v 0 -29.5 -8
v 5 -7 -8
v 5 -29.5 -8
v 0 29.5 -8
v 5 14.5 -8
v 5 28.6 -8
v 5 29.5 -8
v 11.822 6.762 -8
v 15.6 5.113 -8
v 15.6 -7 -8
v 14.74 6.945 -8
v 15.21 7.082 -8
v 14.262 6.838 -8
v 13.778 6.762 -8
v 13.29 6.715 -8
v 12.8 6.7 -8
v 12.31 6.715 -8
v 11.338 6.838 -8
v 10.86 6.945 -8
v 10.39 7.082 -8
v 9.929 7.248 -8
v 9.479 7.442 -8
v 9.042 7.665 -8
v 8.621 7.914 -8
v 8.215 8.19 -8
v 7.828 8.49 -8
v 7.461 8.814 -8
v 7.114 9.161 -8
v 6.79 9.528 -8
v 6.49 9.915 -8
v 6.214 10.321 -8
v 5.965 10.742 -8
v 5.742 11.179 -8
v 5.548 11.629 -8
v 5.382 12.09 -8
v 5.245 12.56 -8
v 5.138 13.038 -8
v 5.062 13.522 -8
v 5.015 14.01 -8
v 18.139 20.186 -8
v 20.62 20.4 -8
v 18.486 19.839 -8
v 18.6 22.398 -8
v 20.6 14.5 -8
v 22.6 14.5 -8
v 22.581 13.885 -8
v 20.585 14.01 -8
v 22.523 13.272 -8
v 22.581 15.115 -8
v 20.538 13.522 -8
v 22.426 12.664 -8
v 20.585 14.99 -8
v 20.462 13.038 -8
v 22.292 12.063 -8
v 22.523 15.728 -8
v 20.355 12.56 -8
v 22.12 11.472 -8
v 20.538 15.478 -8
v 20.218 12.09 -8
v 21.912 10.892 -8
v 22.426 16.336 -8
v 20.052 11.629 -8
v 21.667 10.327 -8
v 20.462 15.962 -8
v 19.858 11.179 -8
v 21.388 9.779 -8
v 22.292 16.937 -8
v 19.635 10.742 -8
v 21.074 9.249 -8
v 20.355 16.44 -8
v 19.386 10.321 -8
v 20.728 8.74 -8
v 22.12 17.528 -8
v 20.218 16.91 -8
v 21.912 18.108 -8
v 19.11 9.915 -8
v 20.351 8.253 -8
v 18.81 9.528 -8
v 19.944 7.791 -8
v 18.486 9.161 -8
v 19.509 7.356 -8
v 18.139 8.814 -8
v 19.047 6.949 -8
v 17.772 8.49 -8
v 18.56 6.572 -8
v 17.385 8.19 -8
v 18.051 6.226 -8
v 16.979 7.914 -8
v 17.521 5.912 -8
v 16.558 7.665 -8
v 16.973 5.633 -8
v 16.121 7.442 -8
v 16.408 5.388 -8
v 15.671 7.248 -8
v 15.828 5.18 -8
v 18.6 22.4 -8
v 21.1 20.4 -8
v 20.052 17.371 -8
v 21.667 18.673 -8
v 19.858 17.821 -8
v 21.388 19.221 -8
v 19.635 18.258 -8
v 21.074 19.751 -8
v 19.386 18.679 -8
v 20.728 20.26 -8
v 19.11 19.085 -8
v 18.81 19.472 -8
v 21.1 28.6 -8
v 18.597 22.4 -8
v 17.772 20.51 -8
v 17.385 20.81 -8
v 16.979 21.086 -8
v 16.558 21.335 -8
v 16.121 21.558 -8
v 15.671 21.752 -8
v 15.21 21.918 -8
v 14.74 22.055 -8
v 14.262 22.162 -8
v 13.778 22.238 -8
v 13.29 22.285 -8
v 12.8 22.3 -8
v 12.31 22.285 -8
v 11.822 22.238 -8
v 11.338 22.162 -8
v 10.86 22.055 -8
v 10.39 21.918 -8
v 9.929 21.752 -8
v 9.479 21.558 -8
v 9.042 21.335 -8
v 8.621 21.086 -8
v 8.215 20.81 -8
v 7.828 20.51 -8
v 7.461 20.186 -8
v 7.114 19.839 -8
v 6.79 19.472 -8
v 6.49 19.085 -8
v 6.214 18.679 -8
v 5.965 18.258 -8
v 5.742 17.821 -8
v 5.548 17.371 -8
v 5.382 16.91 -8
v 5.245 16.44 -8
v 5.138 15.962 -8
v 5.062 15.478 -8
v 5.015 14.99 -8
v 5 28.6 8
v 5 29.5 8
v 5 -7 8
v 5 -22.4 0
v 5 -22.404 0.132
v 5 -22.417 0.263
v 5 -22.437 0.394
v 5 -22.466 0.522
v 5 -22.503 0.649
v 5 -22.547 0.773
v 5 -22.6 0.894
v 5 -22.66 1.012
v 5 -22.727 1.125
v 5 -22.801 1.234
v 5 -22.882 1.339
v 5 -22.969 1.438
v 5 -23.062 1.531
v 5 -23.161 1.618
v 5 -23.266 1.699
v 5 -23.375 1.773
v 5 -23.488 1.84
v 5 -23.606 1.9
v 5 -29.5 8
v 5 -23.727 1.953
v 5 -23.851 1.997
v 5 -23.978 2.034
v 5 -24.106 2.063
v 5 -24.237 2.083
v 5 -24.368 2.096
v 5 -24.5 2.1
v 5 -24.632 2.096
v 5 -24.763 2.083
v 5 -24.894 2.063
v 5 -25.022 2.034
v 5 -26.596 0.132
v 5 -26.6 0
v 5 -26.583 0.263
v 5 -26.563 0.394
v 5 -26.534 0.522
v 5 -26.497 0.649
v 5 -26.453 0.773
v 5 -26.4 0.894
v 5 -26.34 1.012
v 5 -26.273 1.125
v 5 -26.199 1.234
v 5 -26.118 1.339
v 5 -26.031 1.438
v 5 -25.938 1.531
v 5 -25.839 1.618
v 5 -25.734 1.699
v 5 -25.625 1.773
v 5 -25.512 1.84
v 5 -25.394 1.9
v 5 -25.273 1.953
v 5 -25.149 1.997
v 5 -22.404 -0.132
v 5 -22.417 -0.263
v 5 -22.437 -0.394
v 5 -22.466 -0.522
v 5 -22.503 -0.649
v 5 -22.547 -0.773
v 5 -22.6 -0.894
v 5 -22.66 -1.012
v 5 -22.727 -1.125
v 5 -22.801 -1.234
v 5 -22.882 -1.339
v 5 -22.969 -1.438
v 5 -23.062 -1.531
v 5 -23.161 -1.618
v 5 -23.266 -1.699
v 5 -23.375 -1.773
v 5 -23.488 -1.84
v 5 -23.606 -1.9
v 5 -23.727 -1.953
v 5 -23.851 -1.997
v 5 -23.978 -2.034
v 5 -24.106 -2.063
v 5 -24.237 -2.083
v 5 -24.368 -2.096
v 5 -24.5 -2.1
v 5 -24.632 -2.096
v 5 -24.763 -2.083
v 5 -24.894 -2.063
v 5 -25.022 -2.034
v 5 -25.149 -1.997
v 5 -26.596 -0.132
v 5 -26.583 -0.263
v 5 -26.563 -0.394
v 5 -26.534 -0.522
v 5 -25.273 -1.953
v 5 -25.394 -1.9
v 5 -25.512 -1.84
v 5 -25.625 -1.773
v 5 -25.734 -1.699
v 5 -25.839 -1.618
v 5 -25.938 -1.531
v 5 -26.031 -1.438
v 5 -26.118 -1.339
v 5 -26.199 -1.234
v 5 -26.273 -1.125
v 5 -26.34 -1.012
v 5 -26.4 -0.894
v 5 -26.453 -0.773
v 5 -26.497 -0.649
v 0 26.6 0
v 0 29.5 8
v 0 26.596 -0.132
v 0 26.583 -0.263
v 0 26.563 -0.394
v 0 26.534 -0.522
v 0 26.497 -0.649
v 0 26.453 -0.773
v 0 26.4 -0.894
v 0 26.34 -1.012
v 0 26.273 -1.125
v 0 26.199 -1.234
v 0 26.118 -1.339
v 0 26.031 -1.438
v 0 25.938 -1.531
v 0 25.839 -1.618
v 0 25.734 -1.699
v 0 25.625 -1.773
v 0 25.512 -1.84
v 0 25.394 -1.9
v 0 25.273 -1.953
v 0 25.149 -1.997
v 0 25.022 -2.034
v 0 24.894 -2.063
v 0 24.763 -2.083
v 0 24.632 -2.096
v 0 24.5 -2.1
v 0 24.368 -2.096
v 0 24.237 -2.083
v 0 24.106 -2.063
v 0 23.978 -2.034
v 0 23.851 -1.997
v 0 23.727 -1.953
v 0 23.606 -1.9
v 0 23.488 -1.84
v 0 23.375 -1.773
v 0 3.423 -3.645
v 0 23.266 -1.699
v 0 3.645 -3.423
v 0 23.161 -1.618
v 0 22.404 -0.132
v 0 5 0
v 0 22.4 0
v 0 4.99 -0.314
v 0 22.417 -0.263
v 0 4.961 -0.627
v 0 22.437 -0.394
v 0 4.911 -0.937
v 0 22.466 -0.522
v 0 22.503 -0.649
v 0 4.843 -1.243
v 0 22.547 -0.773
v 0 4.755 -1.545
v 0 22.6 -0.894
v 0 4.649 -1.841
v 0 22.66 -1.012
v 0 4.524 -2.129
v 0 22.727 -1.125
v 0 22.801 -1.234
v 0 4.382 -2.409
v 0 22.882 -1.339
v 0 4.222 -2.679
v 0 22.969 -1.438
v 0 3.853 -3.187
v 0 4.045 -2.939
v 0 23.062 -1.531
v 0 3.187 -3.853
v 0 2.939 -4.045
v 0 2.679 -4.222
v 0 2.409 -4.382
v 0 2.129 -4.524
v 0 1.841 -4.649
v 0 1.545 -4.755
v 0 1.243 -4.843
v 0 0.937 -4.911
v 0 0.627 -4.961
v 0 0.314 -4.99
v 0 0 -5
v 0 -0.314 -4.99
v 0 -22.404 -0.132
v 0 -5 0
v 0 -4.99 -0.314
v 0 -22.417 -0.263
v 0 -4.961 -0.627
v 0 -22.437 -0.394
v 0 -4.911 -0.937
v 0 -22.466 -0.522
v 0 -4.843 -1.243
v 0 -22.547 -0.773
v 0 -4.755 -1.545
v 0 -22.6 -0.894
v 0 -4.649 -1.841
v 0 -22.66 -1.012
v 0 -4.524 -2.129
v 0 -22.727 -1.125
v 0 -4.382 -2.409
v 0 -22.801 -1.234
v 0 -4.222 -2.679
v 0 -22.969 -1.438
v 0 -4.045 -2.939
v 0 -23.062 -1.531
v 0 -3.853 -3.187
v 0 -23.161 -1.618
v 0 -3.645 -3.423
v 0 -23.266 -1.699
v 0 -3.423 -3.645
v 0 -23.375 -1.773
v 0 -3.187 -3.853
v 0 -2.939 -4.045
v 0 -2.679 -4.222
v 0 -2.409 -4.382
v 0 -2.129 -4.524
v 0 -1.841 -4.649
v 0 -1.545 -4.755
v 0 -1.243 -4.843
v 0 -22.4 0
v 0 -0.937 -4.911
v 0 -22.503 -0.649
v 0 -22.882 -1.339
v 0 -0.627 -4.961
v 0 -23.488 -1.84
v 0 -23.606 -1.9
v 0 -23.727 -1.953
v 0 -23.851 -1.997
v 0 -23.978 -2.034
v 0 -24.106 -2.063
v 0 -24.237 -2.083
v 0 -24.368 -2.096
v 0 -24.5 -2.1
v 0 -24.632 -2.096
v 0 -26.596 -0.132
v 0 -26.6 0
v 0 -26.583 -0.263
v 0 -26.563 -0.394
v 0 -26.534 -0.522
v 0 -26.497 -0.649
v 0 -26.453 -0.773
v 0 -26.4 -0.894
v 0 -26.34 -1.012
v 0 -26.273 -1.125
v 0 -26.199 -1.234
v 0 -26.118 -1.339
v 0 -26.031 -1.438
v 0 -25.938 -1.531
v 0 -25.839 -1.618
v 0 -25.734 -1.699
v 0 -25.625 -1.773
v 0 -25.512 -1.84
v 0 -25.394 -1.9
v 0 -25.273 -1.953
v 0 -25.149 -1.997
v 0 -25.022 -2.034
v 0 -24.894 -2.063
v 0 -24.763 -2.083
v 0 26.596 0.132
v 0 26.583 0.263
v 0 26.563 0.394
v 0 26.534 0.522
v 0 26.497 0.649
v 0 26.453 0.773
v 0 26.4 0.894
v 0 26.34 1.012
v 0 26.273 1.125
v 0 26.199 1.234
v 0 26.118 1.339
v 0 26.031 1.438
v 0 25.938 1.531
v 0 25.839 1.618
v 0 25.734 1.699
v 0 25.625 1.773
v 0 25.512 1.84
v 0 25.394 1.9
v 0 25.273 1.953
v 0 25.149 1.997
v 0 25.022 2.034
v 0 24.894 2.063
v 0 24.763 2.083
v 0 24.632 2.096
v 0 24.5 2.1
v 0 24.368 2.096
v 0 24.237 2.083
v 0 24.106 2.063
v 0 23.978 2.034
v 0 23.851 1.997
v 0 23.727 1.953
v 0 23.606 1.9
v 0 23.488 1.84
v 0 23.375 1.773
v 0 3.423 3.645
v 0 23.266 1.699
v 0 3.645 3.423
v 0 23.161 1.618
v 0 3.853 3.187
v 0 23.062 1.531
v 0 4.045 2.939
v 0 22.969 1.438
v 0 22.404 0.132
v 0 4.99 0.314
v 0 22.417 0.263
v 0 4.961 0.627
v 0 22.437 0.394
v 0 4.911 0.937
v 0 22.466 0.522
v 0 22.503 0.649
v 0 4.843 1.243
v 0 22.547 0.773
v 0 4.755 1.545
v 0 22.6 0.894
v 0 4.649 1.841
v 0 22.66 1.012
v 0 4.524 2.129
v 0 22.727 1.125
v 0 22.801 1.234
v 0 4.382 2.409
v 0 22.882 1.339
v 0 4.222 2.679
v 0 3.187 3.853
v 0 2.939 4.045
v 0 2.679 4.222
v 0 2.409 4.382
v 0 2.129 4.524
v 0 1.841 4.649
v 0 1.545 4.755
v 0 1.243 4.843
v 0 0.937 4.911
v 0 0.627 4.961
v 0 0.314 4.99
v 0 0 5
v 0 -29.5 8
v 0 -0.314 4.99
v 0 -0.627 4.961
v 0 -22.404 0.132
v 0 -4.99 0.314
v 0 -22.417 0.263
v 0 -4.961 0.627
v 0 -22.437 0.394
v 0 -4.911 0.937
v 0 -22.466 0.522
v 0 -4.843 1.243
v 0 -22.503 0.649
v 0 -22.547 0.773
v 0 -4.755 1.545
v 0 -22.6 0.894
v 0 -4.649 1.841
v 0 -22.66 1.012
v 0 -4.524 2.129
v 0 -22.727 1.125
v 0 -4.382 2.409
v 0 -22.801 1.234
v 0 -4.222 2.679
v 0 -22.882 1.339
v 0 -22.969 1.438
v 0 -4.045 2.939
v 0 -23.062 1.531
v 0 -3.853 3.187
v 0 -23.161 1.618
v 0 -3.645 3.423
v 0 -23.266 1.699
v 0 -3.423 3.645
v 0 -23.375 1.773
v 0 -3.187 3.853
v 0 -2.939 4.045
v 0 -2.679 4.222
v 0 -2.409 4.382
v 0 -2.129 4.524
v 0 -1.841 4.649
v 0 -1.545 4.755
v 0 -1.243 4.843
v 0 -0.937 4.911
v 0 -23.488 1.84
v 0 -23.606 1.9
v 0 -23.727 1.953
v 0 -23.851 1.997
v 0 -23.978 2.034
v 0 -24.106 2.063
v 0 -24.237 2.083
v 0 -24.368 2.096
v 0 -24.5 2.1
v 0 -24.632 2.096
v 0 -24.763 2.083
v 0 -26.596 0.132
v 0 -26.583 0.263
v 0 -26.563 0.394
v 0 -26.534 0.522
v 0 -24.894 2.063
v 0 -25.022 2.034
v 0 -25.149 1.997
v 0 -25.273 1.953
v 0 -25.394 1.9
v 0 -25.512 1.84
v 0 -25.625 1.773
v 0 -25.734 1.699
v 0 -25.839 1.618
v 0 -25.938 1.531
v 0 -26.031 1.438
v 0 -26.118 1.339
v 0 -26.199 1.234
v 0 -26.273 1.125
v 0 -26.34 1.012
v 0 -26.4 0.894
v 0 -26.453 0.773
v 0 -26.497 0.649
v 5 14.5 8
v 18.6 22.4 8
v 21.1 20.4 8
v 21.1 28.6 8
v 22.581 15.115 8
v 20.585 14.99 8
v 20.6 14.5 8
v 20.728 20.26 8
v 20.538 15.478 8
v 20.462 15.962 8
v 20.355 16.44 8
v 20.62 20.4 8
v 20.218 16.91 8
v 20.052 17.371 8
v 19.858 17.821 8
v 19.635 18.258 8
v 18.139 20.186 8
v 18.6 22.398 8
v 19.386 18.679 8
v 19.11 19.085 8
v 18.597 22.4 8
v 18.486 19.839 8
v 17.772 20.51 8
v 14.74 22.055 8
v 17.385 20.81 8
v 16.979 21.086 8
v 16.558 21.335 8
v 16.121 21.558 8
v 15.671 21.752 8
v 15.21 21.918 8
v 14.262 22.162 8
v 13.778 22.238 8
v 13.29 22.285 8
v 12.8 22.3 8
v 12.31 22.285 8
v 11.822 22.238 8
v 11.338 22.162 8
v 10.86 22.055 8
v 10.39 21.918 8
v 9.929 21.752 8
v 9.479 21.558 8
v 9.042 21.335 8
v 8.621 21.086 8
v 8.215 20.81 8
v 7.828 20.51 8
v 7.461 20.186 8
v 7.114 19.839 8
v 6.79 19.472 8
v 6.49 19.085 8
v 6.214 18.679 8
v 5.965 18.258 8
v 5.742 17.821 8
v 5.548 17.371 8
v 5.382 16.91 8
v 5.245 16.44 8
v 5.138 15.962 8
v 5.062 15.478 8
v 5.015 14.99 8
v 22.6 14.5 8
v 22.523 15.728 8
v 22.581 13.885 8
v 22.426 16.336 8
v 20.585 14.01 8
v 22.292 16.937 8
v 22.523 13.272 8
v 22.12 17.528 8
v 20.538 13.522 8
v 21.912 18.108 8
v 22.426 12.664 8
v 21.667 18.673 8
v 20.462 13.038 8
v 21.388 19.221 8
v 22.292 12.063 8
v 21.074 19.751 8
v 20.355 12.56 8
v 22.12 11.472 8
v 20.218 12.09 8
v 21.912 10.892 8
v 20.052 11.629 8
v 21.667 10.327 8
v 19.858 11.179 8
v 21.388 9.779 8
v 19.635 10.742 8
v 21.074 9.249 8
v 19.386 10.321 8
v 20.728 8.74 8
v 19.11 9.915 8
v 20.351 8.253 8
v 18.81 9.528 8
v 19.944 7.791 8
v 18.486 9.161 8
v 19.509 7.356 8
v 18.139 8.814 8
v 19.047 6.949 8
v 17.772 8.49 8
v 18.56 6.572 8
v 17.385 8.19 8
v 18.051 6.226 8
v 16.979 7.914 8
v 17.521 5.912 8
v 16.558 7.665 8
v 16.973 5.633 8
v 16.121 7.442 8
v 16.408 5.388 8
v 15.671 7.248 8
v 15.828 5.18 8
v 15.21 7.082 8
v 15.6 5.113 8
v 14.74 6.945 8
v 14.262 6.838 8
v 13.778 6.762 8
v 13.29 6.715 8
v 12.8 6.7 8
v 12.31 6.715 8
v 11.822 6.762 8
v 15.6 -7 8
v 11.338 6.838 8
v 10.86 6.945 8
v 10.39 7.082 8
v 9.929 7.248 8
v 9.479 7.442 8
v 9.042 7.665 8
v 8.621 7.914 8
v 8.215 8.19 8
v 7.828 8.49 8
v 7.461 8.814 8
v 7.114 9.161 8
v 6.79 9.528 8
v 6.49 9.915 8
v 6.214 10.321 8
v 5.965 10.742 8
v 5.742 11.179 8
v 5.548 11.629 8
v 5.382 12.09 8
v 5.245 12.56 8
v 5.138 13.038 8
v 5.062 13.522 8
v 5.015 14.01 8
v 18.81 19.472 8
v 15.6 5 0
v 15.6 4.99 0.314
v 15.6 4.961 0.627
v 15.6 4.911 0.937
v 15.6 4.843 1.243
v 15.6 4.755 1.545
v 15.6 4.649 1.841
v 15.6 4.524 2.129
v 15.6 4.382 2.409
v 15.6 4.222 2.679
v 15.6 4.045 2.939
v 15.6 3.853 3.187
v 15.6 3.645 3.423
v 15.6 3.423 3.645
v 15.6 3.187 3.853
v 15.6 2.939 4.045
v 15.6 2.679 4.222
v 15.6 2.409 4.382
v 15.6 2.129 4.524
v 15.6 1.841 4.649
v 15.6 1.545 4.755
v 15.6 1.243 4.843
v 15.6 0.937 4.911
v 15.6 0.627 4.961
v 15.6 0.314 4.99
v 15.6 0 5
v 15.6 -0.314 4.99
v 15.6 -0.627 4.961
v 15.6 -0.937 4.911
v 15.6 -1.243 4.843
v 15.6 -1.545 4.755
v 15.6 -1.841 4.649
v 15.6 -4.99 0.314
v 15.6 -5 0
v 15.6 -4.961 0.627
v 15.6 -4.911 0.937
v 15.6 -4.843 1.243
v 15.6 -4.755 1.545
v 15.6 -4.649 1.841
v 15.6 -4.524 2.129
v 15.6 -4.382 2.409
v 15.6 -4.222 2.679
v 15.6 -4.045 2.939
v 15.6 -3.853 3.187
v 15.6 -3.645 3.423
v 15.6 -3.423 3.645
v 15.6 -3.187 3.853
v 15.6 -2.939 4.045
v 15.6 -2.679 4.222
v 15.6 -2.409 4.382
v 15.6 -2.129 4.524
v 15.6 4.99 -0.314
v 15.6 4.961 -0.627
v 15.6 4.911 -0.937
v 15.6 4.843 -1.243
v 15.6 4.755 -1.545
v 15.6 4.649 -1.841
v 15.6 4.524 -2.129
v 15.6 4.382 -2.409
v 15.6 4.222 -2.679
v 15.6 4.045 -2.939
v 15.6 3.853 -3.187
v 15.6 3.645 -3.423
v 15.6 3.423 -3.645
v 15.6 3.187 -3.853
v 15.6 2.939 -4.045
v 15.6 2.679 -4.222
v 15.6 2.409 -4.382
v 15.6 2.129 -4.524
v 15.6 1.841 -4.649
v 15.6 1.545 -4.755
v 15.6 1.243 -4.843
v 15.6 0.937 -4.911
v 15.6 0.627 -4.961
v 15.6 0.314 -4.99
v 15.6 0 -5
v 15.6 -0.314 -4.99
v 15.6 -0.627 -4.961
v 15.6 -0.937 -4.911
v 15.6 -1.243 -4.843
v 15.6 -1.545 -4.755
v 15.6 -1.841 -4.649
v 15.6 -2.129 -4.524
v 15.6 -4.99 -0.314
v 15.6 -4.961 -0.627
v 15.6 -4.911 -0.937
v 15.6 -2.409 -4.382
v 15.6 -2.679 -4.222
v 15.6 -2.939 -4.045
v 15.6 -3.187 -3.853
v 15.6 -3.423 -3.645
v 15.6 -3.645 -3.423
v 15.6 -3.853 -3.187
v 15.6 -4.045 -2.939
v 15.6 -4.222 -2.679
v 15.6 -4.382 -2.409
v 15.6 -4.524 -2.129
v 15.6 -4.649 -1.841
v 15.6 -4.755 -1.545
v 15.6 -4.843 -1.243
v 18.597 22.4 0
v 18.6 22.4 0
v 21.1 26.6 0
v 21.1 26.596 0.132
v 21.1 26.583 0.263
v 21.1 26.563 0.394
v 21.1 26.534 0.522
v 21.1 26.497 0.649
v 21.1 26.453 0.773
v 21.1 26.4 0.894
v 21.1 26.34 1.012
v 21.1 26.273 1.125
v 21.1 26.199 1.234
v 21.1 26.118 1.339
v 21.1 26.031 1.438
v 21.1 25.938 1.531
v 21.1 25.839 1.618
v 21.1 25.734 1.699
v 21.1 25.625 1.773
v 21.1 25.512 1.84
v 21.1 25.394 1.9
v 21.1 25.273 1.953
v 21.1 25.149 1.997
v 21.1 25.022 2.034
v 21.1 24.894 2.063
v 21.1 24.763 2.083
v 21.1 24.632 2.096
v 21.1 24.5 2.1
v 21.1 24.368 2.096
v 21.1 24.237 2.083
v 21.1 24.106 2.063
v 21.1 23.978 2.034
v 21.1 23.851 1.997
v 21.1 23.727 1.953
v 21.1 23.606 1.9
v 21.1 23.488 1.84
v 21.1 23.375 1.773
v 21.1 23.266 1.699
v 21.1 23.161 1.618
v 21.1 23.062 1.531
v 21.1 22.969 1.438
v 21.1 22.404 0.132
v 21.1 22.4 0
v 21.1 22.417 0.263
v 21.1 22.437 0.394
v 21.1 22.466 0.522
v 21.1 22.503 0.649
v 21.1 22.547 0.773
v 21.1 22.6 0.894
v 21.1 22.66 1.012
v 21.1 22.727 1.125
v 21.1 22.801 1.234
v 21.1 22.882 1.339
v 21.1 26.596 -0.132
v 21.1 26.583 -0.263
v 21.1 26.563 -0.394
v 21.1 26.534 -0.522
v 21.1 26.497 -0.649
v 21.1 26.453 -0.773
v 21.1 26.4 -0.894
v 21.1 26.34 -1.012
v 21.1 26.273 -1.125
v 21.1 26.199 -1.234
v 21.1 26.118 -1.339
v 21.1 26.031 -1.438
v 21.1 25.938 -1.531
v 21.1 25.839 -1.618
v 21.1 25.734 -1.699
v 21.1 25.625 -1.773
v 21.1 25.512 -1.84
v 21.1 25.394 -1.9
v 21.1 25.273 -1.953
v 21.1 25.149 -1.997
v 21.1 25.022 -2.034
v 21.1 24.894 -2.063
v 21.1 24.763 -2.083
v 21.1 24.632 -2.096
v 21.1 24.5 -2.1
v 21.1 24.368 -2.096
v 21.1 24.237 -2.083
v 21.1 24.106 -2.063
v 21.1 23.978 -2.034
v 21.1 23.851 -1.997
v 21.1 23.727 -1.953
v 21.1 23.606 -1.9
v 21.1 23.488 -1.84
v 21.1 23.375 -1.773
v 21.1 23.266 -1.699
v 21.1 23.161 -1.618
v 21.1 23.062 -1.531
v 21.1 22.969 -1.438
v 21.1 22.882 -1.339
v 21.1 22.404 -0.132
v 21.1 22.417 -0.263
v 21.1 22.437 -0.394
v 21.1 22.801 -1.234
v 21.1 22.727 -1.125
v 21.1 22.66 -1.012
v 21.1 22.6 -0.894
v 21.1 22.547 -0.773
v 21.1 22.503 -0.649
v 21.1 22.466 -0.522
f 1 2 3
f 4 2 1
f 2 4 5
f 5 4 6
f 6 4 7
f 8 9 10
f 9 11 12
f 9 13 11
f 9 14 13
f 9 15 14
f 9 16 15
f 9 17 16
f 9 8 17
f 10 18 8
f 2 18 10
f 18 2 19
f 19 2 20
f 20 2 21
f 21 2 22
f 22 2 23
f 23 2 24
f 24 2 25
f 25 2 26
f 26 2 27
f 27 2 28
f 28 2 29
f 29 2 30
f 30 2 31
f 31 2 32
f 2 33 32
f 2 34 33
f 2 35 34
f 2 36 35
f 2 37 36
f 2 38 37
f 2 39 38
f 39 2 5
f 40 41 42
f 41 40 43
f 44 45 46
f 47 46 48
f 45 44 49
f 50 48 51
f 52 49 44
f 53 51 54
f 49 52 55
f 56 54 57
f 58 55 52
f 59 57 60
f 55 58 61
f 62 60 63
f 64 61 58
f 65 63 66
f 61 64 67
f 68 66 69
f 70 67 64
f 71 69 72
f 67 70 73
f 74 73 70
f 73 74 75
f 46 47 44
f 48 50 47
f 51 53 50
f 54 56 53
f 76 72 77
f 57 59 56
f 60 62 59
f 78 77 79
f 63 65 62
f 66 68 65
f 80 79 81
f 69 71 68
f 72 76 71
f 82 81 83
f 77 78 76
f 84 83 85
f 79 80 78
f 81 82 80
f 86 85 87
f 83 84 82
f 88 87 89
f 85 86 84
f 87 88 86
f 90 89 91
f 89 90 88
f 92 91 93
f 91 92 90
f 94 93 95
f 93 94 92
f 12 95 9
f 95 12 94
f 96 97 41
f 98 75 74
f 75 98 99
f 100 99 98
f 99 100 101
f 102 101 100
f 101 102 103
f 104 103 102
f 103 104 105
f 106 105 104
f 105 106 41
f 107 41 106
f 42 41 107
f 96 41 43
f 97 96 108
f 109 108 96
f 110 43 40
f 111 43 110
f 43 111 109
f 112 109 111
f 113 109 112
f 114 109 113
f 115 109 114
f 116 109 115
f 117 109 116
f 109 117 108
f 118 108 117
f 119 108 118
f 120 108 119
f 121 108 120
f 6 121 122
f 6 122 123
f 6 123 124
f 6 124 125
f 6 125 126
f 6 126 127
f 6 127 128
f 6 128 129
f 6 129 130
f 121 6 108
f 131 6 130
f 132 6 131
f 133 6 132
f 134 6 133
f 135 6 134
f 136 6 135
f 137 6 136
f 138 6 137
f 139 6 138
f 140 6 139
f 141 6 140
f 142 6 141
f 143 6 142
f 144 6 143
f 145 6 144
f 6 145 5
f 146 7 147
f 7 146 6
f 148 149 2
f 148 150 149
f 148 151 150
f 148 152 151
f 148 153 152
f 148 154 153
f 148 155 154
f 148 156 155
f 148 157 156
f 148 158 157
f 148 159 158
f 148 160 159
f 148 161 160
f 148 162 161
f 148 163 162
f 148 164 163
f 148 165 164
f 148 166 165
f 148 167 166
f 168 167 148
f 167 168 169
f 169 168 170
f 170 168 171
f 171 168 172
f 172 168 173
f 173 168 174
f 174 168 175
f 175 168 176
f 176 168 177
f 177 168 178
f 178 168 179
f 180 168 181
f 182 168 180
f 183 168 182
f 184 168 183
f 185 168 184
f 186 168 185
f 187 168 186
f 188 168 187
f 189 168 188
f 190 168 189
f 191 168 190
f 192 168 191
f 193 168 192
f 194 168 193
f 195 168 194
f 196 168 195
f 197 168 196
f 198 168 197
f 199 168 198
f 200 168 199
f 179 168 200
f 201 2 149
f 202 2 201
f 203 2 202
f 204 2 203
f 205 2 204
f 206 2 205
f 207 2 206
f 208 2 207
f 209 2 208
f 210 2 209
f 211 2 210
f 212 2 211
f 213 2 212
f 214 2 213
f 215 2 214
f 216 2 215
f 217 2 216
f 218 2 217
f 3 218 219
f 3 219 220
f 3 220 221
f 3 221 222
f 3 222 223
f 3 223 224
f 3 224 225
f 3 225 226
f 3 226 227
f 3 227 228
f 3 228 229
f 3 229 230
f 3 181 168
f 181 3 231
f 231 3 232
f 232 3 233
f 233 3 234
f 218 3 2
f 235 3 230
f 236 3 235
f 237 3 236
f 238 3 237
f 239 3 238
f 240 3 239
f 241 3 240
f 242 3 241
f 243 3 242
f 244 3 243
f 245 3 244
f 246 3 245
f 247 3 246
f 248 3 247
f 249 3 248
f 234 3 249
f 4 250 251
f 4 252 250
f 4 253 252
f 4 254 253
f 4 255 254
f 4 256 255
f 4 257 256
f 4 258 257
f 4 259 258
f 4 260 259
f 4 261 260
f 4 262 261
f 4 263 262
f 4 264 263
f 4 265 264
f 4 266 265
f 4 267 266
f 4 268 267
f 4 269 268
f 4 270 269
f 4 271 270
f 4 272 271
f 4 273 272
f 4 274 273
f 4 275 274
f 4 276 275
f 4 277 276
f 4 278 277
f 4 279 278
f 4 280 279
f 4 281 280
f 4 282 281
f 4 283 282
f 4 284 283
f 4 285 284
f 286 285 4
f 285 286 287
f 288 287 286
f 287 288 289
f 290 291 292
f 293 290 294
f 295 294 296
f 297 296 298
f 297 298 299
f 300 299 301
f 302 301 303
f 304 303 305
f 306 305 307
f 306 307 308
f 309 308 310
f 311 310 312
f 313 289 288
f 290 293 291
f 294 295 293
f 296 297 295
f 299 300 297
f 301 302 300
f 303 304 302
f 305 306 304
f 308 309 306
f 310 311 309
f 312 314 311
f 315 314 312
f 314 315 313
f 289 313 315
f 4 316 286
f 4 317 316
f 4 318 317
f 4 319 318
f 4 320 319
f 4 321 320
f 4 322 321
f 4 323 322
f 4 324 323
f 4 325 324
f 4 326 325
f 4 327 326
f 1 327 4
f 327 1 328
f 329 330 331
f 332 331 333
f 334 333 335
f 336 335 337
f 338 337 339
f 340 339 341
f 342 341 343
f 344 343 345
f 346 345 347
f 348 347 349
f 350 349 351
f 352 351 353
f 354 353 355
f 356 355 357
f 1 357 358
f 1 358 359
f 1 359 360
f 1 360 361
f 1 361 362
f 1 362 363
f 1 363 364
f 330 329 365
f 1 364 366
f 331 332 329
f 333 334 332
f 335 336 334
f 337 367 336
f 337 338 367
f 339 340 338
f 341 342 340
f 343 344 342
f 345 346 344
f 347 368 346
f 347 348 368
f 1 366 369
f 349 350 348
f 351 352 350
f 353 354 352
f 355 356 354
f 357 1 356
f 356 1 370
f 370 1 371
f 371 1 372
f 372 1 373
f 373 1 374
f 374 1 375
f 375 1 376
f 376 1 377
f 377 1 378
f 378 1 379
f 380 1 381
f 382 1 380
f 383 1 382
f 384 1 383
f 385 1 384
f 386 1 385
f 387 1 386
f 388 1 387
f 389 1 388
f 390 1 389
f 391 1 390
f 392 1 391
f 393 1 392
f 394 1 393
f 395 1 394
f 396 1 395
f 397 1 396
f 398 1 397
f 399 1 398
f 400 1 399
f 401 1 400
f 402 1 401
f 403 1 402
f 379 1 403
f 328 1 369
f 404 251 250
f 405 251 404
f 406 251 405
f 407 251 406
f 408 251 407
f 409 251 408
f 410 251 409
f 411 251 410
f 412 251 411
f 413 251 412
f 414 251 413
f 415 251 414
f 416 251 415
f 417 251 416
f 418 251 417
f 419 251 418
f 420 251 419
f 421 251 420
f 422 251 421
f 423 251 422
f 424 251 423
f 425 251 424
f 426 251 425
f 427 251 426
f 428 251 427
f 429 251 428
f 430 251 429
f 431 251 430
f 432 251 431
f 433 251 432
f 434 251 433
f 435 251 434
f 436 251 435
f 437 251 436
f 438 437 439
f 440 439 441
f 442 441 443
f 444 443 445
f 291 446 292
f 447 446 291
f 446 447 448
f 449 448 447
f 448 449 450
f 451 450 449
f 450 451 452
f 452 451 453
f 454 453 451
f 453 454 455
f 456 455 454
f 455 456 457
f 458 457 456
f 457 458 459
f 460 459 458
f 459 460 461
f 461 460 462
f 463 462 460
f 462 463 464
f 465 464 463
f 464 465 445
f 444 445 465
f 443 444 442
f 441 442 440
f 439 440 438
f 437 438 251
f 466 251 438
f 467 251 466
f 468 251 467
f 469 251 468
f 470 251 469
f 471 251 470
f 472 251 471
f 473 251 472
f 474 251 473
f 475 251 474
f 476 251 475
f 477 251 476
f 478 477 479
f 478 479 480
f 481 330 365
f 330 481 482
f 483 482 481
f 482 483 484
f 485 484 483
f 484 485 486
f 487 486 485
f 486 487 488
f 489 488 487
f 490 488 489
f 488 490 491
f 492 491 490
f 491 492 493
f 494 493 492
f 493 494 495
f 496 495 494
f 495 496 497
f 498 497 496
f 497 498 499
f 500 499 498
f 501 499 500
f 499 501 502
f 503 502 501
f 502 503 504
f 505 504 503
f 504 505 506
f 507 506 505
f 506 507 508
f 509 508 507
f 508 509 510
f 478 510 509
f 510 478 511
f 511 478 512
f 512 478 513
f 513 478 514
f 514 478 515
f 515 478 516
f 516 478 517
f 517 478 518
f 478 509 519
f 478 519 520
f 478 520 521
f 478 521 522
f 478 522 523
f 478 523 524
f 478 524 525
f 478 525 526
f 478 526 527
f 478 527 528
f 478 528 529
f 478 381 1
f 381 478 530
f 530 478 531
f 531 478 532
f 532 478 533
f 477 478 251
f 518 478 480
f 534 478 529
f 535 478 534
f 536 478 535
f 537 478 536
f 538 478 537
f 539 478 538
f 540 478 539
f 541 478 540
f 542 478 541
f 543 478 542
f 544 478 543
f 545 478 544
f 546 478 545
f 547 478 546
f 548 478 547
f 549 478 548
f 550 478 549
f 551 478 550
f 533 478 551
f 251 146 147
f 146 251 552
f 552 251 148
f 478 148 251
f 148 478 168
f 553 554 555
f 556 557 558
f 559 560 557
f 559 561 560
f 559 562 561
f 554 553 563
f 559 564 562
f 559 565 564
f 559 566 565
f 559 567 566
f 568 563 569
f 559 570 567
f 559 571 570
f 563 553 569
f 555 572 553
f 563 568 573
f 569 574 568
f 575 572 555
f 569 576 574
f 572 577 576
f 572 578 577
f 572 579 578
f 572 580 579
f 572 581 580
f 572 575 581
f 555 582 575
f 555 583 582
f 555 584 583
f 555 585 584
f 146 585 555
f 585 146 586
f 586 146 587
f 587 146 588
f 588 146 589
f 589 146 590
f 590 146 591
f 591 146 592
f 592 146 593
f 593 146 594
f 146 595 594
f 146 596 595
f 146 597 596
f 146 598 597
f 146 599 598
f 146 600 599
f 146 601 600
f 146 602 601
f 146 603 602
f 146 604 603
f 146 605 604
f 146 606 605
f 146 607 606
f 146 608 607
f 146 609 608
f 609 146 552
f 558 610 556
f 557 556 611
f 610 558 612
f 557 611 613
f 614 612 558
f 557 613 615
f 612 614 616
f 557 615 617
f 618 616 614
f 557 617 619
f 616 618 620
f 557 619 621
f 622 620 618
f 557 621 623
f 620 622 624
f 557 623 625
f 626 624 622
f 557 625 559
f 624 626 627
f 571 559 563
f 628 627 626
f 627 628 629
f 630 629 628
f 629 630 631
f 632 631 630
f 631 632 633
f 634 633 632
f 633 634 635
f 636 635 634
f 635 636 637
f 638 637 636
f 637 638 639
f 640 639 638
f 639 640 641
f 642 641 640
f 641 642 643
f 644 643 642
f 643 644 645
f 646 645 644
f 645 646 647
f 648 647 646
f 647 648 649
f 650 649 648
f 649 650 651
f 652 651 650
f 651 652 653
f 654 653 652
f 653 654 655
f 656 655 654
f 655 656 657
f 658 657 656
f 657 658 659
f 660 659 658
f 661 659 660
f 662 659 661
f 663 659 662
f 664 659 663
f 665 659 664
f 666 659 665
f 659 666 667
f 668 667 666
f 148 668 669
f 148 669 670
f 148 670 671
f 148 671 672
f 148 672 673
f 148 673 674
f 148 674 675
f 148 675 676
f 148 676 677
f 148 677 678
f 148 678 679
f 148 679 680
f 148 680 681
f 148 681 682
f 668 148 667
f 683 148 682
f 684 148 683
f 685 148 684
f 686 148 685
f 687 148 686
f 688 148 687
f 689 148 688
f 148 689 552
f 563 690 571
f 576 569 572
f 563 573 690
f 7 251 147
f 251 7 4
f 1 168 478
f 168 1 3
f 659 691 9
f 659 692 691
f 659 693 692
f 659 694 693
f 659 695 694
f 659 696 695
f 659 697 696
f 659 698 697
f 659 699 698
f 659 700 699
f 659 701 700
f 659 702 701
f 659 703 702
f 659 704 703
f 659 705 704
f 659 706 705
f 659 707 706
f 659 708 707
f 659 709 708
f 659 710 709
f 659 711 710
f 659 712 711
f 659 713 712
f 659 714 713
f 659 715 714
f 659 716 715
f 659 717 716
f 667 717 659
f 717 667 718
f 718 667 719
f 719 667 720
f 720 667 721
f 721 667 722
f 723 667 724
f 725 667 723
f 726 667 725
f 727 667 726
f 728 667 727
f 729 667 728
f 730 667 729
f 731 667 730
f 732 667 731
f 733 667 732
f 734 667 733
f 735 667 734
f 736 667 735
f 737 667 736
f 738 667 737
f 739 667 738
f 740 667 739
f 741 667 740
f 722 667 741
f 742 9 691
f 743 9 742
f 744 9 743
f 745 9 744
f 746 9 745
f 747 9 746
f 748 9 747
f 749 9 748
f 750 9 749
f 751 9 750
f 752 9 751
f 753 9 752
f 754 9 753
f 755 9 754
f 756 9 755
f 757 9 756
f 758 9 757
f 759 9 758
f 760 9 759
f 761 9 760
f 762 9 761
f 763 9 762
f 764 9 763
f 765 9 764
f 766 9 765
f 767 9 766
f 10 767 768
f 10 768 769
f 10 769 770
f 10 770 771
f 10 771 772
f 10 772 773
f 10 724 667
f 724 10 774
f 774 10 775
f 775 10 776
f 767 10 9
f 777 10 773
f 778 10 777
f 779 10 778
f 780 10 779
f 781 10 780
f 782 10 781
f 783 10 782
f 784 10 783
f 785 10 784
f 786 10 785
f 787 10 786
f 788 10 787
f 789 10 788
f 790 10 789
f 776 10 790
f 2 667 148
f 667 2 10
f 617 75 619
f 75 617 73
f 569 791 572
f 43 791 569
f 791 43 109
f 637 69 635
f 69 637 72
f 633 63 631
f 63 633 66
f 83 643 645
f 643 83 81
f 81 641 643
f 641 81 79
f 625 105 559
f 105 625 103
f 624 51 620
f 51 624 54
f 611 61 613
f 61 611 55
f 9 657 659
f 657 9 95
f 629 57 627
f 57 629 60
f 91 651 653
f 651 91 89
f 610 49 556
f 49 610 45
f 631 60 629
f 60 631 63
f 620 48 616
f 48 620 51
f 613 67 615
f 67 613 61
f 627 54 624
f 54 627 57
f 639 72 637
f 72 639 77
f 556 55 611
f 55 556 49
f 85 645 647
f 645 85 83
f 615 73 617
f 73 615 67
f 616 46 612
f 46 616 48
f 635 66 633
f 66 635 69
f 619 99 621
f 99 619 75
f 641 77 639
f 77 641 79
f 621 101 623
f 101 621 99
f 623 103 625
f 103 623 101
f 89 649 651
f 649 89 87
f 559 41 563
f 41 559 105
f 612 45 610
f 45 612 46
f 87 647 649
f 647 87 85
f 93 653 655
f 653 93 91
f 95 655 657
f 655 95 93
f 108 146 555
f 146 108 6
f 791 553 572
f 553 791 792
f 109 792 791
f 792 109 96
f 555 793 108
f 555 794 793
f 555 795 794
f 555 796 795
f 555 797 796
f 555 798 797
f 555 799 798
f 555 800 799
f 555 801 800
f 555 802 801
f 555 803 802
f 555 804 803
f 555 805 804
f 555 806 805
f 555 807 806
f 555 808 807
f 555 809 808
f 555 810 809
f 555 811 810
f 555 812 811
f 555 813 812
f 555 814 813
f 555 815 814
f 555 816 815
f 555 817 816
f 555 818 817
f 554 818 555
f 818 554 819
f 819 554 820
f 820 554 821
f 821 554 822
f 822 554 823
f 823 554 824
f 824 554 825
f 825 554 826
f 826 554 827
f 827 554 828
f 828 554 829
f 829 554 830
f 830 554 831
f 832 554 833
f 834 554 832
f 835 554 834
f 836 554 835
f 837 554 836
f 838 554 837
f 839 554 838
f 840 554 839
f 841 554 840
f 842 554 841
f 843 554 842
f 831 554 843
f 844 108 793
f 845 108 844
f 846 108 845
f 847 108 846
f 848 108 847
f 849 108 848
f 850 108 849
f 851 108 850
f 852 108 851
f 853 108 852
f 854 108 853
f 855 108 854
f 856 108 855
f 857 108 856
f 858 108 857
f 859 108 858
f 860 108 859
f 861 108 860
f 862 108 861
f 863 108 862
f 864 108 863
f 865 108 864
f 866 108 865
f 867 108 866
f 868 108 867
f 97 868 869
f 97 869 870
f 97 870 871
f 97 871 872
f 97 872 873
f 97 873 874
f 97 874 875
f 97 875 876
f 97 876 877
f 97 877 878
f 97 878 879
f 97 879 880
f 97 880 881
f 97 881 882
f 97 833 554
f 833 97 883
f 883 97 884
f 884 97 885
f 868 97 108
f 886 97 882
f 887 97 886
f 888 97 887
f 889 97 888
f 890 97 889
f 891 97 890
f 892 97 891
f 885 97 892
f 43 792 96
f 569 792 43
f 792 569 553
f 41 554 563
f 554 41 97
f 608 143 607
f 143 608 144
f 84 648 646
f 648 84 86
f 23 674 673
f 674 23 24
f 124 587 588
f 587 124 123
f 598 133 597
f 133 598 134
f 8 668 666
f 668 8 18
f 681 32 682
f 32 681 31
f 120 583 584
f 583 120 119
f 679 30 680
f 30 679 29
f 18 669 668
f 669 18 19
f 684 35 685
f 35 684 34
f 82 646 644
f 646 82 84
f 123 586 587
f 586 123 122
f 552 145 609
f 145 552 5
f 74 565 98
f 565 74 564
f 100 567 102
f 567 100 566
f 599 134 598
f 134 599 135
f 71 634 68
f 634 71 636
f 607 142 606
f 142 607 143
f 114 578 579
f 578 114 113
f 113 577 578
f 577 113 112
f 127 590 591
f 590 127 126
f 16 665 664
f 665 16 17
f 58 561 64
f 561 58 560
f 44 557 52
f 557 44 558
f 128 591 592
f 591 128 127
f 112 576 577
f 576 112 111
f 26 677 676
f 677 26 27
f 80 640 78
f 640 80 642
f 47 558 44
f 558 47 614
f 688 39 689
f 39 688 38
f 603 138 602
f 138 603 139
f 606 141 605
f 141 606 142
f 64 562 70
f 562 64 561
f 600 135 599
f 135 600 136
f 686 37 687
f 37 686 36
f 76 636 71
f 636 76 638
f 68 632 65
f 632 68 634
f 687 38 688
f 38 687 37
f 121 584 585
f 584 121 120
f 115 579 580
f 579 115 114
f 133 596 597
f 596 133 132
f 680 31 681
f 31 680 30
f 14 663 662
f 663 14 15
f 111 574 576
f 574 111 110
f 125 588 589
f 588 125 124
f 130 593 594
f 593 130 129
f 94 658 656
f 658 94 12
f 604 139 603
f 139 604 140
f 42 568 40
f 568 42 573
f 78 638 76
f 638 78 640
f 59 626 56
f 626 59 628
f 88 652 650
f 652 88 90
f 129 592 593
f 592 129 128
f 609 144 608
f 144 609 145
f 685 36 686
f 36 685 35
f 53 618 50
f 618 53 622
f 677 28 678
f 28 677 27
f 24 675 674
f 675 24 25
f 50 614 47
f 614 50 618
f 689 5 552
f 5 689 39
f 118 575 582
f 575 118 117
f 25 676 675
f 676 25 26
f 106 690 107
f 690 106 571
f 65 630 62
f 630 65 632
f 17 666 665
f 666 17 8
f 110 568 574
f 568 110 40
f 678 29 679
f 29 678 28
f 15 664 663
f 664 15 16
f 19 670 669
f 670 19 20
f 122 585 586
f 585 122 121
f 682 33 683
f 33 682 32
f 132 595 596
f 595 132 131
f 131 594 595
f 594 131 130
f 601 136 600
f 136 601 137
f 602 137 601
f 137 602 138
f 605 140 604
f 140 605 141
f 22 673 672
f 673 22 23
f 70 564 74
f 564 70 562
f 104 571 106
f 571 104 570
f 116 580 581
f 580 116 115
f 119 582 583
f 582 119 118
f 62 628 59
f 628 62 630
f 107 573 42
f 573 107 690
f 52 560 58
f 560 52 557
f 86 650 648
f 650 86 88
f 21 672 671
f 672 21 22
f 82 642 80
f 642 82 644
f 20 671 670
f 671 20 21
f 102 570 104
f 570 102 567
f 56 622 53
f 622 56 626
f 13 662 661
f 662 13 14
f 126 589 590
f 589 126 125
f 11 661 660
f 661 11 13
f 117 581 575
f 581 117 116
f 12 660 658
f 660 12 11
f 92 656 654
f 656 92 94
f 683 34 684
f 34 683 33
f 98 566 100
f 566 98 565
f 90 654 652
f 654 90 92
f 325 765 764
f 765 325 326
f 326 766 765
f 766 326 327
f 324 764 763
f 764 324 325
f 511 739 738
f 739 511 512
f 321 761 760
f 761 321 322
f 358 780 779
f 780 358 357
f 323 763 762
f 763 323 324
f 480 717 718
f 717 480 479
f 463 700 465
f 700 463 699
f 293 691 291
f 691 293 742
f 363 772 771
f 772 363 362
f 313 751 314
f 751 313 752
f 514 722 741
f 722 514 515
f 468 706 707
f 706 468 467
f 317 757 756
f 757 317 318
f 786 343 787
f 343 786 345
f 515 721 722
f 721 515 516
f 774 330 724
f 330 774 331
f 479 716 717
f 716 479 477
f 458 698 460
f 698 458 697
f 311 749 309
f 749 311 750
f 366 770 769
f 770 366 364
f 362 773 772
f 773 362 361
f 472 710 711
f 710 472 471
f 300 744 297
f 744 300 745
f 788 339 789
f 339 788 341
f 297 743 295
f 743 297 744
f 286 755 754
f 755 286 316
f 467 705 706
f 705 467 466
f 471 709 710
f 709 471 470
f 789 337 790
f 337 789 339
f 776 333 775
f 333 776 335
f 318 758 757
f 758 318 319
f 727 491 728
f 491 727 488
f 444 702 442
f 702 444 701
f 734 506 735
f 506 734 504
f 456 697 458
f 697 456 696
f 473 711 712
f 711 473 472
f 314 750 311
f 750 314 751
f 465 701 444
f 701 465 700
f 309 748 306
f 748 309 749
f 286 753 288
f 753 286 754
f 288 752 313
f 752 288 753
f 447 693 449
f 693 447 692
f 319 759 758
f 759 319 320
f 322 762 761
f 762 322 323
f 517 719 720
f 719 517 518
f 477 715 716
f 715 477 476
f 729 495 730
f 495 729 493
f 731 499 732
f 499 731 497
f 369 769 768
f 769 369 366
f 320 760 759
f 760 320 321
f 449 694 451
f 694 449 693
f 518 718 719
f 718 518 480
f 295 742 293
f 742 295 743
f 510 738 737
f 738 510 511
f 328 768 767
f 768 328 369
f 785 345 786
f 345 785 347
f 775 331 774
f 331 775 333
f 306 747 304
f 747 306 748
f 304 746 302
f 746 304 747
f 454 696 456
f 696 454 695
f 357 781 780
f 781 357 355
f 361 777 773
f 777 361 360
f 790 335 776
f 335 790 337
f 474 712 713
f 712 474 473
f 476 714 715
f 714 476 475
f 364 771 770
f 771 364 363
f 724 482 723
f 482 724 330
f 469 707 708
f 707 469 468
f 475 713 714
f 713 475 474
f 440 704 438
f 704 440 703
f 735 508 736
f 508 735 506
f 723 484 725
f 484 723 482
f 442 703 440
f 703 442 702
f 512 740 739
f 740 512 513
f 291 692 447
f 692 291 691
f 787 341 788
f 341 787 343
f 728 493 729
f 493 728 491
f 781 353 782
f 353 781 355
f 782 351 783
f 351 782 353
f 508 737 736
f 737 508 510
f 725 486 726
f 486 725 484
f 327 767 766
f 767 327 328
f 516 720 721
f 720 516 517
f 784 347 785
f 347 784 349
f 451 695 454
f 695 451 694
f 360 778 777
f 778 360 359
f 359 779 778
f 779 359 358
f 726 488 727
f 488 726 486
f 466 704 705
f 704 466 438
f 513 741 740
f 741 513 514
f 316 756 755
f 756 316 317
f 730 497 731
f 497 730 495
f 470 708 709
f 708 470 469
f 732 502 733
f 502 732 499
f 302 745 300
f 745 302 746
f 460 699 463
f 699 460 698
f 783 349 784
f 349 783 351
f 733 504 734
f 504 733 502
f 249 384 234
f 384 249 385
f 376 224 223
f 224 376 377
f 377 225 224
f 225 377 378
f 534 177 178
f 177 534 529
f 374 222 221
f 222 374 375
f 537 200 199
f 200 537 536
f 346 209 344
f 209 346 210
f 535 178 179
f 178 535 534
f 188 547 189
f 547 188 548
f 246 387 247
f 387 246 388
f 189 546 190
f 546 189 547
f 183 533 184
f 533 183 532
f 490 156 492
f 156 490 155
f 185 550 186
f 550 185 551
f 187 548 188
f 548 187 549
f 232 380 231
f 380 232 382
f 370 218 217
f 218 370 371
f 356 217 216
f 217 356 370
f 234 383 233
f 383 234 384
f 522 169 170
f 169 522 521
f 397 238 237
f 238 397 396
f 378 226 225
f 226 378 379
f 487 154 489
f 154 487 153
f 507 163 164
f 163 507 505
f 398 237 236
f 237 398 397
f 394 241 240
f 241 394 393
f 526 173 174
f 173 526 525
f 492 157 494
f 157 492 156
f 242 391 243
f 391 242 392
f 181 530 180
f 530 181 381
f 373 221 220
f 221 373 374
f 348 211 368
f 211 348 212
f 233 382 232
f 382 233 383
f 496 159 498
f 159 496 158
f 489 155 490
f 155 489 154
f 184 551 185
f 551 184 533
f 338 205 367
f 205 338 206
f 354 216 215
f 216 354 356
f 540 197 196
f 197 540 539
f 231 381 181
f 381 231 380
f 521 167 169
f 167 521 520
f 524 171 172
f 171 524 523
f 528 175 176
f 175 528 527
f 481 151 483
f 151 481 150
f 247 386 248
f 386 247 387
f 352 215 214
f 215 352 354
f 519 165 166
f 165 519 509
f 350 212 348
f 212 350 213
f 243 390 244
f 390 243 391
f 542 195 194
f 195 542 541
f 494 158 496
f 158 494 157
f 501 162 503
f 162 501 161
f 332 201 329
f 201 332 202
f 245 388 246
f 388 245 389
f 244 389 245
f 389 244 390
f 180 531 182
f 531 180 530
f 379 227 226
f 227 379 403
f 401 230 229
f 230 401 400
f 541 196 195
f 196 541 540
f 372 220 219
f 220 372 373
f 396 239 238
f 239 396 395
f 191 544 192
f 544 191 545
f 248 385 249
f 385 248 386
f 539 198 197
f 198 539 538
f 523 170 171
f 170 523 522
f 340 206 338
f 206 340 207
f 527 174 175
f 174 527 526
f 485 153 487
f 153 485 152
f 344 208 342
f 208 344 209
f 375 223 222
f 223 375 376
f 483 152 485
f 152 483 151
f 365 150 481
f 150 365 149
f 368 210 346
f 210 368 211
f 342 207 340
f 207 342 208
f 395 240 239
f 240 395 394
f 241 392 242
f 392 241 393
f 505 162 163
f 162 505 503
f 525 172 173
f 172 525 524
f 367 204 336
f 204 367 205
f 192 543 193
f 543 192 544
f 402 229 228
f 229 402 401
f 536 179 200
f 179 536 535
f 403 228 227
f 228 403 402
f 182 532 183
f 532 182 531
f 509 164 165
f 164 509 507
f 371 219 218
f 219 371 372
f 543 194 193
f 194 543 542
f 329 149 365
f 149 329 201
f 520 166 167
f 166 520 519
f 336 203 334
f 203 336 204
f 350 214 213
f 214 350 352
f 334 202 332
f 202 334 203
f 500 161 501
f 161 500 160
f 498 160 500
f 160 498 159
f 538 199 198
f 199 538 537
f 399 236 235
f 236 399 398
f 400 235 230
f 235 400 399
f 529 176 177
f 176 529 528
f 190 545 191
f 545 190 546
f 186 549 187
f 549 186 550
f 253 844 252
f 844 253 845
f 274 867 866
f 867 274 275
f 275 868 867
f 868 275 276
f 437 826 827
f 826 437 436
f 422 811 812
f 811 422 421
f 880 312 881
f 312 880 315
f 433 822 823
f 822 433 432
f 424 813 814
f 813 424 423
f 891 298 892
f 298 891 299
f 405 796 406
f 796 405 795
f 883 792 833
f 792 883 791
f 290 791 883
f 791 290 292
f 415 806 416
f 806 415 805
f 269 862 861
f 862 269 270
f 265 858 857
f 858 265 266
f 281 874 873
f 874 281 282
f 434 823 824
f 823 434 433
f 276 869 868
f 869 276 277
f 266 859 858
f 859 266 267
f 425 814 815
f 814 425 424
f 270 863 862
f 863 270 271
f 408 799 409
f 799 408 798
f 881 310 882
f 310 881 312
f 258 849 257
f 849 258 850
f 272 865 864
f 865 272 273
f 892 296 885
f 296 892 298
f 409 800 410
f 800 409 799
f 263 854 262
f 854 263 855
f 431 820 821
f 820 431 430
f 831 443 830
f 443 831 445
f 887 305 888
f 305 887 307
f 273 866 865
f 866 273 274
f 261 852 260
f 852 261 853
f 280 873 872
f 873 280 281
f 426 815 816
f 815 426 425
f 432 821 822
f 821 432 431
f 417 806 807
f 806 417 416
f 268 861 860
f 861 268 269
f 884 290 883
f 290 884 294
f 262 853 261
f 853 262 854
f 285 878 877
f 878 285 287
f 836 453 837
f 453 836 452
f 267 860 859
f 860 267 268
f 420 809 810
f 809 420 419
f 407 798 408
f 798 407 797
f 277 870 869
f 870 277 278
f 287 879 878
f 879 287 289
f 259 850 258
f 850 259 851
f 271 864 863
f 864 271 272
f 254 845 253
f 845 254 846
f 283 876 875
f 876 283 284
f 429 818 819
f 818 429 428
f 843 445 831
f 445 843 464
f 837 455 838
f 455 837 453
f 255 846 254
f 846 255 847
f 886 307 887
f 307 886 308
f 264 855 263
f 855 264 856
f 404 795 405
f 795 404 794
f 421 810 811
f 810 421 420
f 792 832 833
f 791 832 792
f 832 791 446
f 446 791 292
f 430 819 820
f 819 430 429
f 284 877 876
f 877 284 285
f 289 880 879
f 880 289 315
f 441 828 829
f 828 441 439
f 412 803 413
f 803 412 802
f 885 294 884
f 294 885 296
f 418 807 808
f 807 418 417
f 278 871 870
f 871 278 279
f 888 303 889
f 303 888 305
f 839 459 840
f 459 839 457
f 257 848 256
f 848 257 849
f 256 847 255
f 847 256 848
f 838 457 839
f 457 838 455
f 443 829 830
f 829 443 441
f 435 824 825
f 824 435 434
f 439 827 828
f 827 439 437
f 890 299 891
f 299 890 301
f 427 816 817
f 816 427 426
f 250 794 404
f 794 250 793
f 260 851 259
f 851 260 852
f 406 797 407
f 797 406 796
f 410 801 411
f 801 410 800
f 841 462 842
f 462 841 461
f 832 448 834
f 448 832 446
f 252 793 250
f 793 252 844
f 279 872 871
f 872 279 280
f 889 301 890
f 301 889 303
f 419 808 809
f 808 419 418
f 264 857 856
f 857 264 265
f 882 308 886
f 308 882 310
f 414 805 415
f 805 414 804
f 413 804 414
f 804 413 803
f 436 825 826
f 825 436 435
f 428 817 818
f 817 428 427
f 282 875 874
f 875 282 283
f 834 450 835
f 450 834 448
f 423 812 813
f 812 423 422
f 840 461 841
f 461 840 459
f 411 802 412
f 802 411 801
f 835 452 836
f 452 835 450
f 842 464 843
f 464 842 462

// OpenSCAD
module gregs_to_bowden(){

dia = 49;
extrawidth = 5;

height = 5;
extraheight = 20-height;
width = 16;
m8hole = 10;
m4hole = 4.2;
$fn=100;

y=14.5;
z=5;
bearing_dia = 15.6;

rotate([0,90,0])
	difference(){
		union(){
			translate([-width/2,-dia/2-extrawidth,0]) cube([width,dia+extrawidth*2,height]);

			translate([-width/2,-m8hole/2-2,0]) cube([width,m8hole+4,bearing_dia]);

			//#cylinder(height+extraheight,m8hole/2+2,m8hole/2+2);	

			translate([-width/2,y,bearing_dia/2+z]) rotate([0,90,0]) cylinder(width,bearing_dia/2+2,bearing_dia/2+2);
			translate([-width/2,y-bearing_dia/2-2,bearing_dia/2+z]) rotate([0,90,0]) cube([width-z,bearing_dia+4,width]);

//			translate([0,-4,z]) cube([20,8,8]);

			// extra blok rechts
			translate([-width/2,dia/2-m4hole/2,0]) #cube([width,m4hole+2,bearing_dia+5]);
			translate([-width/2,dia/2-m4hole/2-2,bearing_dia+3]) #cube([width,m4hole+2*2,2.5]);

	
		}
			translate([-width/2-1,y,bearing_dia/2+z]) rotate([0,90,0]) cylinder(width+10,bearing_dia/2,bearing_dia/2);

		#cylinder(20,m8hole/2,m8hole/2);
		//translate([0,0,height+extraheight])#cylinder(200,m8hole/2+2,m8hole/2+2);
		translate([0,-dia/2,0]) #cylinder(height+20,m4hole/2,m4hole/2);
		translate([0,dia/2,0]) #cylinder(height+20,m4hole/2,m4hole/2);

		// look-though hole... this is pretty useless :)
		//translate([-width/2-1,0,height/2+2]) rotate([0,90,0]) #cylinder(width+2,2,2);

	}

}

gregs_to_bowden();
